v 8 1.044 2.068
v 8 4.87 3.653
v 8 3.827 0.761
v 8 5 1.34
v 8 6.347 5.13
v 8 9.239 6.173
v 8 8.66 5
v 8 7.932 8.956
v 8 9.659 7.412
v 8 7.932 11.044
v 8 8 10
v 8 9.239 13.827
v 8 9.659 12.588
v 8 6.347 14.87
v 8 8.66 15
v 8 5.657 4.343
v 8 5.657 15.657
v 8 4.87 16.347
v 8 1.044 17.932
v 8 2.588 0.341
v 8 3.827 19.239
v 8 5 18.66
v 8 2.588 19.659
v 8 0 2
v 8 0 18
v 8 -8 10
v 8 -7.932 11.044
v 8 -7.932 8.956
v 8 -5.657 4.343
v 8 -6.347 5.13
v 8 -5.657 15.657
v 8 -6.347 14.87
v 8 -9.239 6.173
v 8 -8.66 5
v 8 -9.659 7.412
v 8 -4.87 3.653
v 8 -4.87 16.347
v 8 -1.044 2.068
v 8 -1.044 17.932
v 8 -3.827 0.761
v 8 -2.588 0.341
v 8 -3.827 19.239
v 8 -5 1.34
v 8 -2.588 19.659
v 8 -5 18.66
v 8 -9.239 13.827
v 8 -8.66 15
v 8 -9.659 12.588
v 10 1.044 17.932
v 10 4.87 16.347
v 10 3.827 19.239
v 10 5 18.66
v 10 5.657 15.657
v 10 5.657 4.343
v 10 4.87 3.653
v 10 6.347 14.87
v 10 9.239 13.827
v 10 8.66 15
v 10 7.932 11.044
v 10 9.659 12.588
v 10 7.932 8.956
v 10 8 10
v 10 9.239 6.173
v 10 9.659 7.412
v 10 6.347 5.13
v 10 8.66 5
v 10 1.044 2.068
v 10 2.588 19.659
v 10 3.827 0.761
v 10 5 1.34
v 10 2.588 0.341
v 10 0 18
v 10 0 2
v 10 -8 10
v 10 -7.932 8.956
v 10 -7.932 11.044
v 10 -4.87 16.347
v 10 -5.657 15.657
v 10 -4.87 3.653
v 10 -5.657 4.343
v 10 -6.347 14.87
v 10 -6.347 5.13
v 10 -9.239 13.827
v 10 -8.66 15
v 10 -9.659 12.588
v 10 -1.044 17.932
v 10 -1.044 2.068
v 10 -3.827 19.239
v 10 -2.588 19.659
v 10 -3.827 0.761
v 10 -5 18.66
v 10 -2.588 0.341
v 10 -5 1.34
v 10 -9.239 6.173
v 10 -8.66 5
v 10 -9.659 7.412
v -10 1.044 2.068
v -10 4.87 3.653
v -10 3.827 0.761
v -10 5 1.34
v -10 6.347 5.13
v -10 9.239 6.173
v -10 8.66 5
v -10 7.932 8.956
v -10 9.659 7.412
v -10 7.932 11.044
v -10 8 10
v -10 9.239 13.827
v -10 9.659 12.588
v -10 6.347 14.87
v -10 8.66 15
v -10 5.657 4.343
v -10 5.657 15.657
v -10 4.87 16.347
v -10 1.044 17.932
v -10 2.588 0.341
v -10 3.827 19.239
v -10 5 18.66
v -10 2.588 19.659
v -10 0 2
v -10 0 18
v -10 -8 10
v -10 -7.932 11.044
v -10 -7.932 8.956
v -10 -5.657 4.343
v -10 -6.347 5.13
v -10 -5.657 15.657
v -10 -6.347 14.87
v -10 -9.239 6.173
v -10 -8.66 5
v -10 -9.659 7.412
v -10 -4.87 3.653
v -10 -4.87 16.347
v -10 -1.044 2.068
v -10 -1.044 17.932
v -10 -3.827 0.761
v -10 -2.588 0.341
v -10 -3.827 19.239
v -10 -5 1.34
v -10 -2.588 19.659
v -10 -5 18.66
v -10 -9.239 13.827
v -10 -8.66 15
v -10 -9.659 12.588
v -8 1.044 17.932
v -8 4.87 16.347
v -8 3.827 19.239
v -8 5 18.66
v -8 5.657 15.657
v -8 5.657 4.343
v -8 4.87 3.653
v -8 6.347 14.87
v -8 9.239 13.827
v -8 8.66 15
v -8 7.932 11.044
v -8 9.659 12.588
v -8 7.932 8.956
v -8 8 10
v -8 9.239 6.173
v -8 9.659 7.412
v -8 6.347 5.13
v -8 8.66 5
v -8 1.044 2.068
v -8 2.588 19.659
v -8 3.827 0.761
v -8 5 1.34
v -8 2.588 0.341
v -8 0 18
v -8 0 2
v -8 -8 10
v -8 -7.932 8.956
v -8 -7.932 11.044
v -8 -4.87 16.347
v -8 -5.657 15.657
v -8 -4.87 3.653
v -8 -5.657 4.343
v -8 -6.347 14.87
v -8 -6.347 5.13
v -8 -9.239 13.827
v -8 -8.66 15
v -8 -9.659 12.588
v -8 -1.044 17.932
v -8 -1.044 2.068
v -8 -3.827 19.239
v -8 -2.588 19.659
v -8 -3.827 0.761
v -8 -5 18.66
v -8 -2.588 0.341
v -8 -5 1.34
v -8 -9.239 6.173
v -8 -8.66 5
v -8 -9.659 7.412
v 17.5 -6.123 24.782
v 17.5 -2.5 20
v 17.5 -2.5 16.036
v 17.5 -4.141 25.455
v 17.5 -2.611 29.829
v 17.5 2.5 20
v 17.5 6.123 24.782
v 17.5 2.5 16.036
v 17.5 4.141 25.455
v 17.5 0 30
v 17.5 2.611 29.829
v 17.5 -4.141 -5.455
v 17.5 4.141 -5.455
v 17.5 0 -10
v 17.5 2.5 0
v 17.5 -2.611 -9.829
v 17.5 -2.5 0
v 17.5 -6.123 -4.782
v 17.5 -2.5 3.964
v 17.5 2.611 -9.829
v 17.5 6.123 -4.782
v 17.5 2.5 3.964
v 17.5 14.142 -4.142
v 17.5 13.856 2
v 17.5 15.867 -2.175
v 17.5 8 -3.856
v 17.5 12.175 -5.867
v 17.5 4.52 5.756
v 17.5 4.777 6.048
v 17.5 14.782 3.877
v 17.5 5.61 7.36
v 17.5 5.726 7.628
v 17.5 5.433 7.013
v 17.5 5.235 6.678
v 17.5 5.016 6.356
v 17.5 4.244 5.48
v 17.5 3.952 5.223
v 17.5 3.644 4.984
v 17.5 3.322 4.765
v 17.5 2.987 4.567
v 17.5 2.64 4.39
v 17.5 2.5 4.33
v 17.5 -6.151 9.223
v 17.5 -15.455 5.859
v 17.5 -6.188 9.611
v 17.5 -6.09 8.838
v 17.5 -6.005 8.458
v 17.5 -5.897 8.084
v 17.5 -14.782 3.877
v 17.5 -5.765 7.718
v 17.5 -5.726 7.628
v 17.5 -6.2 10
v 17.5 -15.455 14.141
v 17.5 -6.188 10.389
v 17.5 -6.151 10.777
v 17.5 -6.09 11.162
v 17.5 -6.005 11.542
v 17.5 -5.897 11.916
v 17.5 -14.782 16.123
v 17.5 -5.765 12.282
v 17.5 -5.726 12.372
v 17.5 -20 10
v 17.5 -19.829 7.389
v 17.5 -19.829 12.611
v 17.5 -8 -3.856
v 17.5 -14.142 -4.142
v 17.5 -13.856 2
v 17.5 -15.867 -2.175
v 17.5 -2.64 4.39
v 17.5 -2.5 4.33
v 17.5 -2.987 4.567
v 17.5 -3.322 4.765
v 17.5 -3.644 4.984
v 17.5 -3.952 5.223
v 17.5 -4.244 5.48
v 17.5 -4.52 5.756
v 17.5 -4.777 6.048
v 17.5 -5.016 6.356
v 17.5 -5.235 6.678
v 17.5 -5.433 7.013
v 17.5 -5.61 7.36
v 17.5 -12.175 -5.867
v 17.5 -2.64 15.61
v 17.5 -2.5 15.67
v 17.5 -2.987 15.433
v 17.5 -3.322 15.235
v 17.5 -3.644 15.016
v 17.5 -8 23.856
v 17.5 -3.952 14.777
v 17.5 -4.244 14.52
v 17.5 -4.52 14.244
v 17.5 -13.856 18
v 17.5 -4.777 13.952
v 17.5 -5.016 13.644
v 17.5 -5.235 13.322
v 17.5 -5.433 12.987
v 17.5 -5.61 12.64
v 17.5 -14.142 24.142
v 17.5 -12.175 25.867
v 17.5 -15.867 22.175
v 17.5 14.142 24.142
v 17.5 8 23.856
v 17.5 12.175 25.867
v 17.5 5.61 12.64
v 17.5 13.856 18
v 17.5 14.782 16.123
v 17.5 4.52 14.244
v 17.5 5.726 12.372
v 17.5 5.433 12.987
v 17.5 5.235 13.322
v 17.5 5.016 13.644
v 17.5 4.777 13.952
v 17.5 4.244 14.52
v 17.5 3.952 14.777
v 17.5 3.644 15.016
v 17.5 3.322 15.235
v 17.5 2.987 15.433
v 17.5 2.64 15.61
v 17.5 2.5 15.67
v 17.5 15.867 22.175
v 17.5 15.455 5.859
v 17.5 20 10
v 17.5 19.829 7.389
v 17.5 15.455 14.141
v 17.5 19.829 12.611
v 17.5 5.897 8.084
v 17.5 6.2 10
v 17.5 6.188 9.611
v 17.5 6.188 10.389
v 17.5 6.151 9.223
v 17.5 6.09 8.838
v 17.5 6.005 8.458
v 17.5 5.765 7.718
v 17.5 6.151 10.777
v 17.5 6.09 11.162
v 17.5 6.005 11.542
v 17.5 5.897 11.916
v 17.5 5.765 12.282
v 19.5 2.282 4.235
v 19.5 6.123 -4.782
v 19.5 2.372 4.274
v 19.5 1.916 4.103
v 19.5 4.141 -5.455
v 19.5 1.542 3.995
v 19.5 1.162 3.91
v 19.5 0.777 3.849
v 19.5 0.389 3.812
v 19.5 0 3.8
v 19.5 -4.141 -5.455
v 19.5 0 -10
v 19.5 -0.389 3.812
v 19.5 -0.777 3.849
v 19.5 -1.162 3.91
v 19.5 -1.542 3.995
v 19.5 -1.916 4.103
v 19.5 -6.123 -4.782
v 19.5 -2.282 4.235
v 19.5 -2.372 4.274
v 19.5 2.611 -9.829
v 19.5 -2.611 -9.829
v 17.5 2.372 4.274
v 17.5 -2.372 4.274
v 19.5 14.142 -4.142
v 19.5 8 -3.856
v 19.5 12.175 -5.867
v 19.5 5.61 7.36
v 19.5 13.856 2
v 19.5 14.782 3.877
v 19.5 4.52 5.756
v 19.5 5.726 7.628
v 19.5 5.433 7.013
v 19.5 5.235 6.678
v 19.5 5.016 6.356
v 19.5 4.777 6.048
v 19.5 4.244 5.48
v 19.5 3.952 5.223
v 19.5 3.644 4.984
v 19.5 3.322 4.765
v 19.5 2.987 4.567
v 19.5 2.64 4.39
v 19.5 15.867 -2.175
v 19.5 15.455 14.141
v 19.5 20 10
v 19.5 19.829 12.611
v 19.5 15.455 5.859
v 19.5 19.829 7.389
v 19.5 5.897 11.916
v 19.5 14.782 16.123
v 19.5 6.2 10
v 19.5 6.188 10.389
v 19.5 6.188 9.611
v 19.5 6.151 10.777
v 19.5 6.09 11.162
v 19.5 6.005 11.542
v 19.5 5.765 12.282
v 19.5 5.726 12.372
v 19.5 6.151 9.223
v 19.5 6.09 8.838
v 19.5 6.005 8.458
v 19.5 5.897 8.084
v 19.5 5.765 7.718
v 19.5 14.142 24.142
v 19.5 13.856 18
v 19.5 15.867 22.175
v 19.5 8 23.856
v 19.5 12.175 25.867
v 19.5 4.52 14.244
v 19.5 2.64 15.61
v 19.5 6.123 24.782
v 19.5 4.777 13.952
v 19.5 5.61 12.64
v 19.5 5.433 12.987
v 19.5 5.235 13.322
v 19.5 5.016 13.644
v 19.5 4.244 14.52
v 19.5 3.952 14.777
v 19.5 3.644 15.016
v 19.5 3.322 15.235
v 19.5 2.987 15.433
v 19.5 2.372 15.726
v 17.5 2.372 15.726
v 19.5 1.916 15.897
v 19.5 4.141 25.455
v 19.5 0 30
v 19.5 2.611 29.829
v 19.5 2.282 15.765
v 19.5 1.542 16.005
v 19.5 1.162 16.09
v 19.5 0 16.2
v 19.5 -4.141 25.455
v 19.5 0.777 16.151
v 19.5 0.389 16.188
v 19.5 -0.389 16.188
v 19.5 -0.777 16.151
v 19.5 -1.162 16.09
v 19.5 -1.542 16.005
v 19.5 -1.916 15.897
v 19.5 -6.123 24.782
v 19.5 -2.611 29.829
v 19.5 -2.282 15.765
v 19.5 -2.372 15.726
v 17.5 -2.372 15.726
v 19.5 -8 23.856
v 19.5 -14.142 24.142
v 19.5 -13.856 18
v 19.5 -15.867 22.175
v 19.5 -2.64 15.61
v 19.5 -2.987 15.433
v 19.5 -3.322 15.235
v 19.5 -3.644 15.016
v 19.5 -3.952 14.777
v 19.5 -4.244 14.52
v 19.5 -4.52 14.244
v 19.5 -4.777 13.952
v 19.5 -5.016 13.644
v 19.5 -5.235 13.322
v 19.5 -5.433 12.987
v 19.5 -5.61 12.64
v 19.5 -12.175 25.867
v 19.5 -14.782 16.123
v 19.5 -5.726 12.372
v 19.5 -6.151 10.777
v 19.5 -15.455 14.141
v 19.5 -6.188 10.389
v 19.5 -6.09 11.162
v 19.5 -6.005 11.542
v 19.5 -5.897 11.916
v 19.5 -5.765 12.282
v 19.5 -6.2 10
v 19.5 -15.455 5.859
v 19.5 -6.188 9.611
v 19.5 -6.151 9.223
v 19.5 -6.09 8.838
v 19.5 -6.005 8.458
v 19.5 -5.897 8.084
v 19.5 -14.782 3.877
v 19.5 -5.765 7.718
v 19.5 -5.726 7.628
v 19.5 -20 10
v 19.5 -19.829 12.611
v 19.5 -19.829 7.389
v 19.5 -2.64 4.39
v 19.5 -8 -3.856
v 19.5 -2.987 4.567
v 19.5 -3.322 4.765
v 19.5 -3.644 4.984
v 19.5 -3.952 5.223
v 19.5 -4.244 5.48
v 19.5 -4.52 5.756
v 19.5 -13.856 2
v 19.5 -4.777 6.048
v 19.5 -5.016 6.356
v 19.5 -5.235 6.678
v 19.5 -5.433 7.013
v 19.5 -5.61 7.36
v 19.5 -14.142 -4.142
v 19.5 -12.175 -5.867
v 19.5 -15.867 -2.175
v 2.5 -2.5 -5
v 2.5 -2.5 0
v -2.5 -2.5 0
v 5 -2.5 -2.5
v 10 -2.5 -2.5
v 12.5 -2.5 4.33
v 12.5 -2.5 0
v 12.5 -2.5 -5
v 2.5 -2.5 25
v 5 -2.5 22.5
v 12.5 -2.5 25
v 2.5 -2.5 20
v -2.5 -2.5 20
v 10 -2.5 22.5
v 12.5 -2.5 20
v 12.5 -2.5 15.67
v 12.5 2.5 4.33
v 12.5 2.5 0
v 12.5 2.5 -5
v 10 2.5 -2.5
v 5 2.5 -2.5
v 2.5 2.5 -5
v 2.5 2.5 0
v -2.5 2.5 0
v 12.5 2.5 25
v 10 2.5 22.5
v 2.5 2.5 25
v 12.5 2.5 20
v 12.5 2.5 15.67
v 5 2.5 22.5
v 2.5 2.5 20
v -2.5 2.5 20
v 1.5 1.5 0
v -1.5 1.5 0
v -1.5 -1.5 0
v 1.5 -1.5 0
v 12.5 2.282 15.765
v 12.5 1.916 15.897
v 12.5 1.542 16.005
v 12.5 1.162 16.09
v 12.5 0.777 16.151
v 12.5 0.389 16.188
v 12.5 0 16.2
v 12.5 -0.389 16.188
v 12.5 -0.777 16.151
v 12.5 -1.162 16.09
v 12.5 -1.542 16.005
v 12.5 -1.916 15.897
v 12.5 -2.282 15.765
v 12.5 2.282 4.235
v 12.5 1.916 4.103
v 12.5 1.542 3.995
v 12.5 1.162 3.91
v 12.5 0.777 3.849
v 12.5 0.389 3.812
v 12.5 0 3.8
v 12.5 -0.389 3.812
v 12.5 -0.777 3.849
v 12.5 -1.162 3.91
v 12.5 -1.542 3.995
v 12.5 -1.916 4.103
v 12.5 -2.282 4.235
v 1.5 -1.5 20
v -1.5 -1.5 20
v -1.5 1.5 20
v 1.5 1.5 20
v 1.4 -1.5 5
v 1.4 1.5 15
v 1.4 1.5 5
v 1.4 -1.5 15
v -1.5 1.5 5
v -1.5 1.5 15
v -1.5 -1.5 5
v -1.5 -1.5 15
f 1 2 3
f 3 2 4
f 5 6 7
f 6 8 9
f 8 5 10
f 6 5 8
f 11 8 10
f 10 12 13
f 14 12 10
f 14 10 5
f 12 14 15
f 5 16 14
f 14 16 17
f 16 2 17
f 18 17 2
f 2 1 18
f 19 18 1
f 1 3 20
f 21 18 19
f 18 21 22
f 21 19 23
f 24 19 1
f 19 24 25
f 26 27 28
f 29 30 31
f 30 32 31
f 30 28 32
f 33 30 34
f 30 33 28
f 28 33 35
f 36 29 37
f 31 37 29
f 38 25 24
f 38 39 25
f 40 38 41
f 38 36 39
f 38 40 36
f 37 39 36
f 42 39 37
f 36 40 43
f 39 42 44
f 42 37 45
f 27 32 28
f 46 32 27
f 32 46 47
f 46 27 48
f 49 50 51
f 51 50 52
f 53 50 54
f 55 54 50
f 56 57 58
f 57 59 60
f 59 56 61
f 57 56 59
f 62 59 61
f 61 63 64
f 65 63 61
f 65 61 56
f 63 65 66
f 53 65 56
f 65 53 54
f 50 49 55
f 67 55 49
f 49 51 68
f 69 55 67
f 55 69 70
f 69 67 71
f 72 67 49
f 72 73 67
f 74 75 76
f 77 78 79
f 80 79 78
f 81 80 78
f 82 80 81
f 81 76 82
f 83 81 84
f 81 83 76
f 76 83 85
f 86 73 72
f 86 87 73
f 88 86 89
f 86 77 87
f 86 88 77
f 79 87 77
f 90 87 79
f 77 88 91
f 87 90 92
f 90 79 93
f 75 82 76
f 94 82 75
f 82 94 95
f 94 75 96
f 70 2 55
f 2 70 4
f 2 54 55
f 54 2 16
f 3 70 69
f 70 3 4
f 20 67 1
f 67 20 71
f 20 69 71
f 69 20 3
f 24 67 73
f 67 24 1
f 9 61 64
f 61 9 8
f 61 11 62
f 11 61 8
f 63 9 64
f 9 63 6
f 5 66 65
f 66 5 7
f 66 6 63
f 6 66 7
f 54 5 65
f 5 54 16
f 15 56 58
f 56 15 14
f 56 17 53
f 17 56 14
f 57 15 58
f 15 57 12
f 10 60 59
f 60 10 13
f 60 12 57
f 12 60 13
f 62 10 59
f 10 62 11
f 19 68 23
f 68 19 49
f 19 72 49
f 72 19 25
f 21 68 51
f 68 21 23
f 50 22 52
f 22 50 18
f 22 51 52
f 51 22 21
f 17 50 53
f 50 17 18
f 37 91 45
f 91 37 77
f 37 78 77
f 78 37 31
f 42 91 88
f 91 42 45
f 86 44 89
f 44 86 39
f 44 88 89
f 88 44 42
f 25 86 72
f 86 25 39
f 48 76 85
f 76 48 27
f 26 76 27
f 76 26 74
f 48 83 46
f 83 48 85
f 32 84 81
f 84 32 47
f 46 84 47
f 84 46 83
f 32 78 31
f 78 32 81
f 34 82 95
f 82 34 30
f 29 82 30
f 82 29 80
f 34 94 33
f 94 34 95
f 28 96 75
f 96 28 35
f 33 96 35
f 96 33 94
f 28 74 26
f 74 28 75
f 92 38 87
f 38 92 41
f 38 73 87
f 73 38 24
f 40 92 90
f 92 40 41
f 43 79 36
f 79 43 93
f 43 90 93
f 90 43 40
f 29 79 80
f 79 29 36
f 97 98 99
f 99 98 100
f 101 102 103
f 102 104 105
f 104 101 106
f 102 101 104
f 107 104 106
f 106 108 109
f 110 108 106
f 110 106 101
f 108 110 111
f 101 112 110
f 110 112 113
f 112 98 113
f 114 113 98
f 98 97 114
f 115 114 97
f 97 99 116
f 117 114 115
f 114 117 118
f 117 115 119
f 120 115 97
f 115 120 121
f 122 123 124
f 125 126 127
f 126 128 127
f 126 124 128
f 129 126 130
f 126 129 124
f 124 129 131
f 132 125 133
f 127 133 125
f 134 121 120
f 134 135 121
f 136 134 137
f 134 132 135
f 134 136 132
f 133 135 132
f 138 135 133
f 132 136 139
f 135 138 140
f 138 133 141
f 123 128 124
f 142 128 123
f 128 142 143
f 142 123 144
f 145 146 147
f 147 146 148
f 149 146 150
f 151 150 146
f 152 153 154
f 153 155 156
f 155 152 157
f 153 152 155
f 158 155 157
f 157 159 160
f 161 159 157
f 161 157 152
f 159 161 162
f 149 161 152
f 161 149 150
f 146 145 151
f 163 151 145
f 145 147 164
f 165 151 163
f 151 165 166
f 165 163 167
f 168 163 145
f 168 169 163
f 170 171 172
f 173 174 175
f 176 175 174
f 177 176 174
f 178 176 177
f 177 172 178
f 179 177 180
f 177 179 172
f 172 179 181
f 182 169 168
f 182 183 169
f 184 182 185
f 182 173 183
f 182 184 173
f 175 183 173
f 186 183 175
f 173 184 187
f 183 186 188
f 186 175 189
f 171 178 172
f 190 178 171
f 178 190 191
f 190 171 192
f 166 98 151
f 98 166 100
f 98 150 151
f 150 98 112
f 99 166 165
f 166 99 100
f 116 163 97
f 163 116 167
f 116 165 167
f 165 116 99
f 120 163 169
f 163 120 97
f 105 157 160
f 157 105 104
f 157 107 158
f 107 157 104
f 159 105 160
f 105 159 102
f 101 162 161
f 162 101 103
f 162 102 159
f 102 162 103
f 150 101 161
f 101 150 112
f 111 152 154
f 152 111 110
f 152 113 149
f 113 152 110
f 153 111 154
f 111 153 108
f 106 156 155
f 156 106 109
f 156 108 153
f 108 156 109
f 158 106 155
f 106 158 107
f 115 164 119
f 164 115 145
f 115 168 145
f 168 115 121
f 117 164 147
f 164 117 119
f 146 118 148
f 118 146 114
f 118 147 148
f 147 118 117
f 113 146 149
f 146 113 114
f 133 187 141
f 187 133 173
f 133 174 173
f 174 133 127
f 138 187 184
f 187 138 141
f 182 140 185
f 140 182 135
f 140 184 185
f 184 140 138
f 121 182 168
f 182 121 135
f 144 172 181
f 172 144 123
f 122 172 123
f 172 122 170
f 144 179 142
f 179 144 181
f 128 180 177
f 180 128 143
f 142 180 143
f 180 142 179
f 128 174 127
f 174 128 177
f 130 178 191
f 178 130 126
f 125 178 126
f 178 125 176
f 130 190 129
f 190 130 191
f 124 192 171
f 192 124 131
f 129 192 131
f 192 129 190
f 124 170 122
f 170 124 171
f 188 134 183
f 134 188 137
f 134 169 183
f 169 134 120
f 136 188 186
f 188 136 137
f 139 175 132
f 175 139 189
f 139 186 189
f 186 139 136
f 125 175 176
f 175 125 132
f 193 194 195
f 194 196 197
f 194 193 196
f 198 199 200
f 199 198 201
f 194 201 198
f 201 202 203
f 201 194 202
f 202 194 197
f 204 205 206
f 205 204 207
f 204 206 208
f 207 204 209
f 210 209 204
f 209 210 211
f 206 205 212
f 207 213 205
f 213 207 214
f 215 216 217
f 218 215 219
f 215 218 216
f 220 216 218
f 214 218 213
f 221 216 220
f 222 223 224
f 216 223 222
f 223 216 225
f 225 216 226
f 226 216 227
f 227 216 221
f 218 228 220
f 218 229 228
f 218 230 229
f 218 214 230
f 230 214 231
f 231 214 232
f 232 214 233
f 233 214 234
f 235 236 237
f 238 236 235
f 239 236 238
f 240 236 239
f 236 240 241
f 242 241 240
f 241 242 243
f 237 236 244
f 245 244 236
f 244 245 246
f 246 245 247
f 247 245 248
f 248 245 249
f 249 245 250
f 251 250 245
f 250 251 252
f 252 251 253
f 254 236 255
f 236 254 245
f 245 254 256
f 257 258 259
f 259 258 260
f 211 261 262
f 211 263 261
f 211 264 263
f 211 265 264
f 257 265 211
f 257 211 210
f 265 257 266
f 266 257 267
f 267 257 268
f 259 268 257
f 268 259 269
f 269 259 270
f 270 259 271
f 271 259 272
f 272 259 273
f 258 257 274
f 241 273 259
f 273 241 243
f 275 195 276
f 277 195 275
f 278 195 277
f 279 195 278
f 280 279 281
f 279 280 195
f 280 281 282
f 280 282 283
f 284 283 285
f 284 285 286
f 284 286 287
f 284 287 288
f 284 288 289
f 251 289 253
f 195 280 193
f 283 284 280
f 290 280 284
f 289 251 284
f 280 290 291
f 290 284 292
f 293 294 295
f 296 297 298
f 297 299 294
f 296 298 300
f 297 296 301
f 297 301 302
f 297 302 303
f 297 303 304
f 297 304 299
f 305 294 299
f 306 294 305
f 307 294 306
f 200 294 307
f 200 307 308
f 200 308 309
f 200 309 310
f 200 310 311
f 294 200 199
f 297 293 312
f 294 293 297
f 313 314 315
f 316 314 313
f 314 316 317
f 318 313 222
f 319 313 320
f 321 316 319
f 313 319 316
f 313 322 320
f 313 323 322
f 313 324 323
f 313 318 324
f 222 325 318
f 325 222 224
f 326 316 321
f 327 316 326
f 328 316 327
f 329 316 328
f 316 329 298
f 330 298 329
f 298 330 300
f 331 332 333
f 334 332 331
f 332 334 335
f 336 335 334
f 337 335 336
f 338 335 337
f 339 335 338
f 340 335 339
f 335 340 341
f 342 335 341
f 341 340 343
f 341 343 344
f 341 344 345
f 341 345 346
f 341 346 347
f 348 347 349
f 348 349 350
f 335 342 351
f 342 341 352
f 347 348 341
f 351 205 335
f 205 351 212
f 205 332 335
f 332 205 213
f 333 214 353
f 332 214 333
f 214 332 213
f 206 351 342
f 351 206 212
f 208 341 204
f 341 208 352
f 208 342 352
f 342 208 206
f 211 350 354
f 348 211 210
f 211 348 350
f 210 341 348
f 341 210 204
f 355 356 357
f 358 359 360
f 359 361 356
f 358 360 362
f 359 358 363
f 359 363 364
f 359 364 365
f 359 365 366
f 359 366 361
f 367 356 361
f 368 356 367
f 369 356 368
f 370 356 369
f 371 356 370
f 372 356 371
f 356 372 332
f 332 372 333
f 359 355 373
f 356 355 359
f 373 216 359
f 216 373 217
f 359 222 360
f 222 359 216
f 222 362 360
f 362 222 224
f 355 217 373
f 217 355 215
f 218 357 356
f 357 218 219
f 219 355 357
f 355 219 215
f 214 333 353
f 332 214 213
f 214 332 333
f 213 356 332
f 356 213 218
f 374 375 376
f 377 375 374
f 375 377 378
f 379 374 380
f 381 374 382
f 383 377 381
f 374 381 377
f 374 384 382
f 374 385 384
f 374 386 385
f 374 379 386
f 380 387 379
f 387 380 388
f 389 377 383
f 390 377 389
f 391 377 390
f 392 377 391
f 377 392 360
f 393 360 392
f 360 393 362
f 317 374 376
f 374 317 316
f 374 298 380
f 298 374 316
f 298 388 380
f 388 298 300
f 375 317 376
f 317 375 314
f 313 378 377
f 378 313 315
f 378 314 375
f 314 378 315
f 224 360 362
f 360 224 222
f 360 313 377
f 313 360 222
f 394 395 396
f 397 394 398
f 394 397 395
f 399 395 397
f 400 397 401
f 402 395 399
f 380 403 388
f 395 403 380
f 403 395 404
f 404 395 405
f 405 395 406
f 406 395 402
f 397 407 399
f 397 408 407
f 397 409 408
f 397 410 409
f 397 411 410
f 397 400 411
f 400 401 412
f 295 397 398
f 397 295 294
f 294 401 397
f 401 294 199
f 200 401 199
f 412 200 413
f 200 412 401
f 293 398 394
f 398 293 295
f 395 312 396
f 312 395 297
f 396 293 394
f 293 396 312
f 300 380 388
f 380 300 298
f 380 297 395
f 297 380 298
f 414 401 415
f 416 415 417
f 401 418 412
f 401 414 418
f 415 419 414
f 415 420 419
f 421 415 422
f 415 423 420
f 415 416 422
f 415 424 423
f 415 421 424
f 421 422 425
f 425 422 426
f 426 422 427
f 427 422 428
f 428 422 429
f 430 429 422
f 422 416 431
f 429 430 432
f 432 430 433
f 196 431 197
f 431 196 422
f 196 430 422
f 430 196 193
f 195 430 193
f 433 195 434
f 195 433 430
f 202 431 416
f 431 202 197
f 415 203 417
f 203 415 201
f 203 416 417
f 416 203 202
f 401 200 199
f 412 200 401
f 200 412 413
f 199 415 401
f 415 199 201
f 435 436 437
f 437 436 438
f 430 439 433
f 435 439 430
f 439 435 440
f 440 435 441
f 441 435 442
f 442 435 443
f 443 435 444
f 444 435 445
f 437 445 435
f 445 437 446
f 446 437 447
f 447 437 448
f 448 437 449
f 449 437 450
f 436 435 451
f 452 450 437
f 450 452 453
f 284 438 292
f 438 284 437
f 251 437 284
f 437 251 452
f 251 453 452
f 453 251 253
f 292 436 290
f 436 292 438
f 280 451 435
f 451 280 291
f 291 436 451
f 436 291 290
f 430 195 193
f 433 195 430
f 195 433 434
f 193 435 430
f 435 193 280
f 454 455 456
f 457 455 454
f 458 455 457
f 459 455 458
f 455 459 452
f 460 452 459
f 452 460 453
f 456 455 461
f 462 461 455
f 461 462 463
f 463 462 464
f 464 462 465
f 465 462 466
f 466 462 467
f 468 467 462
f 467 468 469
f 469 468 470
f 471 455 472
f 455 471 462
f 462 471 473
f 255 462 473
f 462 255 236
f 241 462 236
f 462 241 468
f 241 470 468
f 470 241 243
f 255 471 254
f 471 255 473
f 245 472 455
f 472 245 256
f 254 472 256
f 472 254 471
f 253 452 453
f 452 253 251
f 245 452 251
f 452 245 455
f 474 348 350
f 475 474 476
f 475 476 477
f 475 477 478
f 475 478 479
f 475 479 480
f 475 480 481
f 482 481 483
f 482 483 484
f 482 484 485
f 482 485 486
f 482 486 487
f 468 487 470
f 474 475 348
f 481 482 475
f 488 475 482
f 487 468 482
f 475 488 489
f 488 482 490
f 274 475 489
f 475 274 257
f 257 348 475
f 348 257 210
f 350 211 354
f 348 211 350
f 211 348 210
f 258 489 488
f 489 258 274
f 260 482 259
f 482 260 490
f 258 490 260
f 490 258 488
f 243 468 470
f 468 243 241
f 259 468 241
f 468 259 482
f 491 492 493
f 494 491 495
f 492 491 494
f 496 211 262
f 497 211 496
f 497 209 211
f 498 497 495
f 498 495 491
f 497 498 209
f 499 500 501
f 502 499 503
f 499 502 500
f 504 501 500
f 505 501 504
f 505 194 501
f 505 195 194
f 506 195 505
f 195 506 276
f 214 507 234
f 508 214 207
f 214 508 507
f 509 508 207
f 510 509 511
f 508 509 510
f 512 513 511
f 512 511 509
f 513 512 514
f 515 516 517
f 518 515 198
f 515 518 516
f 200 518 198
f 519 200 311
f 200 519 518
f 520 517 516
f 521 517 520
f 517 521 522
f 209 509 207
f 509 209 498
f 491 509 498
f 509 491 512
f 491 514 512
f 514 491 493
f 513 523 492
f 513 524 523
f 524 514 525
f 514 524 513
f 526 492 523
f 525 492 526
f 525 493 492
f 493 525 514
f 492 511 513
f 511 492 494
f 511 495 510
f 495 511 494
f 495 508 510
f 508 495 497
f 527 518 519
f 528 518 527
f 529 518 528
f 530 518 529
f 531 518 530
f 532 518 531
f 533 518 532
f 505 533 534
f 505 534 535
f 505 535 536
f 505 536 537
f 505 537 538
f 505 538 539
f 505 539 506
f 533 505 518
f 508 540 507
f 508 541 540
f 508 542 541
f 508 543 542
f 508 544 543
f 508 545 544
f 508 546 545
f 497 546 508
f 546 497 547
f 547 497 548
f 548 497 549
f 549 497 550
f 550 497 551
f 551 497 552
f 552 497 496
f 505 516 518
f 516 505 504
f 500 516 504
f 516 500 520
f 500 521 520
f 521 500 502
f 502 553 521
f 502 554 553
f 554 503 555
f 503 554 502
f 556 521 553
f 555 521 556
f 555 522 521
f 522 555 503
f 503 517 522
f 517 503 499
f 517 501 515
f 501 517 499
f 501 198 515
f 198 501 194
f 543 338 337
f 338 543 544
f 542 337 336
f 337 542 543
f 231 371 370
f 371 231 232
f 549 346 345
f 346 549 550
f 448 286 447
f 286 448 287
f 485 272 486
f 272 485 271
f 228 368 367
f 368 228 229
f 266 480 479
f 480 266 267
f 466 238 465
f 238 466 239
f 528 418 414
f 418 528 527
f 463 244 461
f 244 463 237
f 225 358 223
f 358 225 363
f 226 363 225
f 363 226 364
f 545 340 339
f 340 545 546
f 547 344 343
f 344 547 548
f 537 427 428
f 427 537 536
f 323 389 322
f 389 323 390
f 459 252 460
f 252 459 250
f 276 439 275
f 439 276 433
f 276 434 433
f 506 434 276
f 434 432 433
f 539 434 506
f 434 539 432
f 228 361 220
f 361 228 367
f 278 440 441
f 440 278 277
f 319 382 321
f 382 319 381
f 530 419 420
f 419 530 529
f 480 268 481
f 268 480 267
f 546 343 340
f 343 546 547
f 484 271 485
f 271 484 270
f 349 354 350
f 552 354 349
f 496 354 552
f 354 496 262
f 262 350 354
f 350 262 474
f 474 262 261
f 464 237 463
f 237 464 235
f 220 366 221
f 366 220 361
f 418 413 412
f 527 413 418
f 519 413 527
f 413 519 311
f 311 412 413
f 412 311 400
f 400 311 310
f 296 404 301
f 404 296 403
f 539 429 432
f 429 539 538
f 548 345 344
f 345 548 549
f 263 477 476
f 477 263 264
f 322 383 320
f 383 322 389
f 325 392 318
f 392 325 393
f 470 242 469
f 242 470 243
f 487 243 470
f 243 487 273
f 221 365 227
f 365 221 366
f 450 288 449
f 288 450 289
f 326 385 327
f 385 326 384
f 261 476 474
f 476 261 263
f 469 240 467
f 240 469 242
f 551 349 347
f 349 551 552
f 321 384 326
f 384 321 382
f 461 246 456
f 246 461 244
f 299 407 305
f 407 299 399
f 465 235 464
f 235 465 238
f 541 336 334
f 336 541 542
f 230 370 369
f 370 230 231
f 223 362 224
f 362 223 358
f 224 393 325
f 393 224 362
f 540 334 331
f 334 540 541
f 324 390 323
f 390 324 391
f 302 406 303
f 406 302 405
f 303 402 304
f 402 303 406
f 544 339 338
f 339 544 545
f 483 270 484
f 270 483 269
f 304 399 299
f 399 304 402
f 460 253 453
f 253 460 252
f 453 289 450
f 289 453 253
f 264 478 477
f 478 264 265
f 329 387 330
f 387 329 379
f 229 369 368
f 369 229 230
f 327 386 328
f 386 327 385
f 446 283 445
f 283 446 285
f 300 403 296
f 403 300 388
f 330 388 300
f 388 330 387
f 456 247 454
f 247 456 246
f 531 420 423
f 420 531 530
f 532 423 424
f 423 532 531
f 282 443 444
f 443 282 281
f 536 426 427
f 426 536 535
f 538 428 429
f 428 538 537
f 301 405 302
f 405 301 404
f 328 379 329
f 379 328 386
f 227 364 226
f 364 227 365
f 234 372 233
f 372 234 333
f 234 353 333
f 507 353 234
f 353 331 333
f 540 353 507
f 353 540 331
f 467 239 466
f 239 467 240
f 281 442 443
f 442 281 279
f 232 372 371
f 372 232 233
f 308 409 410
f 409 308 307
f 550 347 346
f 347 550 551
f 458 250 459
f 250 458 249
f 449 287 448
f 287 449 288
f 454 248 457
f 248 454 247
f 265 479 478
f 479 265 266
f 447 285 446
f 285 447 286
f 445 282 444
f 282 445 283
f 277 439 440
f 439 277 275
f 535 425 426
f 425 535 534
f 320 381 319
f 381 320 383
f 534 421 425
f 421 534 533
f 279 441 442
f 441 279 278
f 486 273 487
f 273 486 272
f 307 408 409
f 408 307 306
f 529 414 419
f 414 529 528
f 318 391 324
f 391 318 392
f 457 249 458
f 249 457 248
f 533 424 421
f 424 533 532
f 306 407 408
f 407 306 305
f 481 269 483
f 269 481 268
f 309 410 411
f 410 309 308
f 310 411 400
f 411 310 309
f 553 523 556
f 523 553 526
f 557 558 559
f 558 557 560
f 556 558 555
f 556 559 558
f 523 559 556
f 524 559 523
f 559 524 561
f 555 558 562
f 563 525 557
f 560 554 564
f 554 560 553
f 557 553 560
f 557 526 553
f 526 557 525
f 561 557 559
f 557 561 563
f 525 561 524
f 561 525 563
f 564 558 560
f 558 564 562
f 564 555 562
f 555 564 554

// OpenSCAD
module gear(n, r, h, l) {
    tooth_angle = 360 / n / 2;
    
    
    for (i = [0: n]) {
        rotate([0, 0, tooth_angle * i * 2])
        union() {
            linear_extrude(l)
            polygon([
                [0, 0],
                [r, 0],
                [r * cos(tooth_angle / 3), r * sin(tooth_angle / 3)],
                [(r-h) * cos(2 * tooth_angle / 3), (r-h) * sin(2 * tooth_angle / 3)],
                [(r-h) * cos(tooth_angle), (r-h) * sin(tooth_angle)]
            ]);
            
            linear_extrude(l)
            rotate([180, 0, 0])
            polygon([
                [0, 0],
                [r, 0],
                [r * cos(tooth_angle / 3), r * sin(tooth_angle / 3)],
                [(r-h) * cos(2 * tooth_angle / 3), (r-h) * sin(2 * tooth_angle / 3)],
                [(r-h) * cos(tooth_angle), (r-h) * sin(tooth_angle)]
            ]);
        }
    }
}

module axis_gears() {
    translate([8, 0, 10])
    rotate([22.5, 0, 0])
    rotate([0, 90, 0])
    gear(8, 10, 2, 2);
    
    translate([-10, 0, 10])
    rotate([22.5, 0, 0])
    rotate([0, 90, 0])
    gear(8, 10, 2, 2);
}

module gears() {
    gear(8, 10, 2, 2);

    translate([0, 0, 18])
    gear(8, 10, 2, 2);
}

module spinning_gears() {
    difference() {
        union() {
            translate([-2.5, -2.5, 0])
            rotate([-90, 0, 0])
            linear_extrude(5)
            polygon([
                [0, 0], [5, 5], [15, 5], [20, 0], [20, -20], [15, -25],
                [5, -25], [0, -20], [5, -20], [7.5, -22.5], [12.5, -22.5], 
                [15, -20], [15, 0], [12.5, 2.5], [7.5, 2.5], [5, 0]
            ]);
            
            translate([17.5, 0, 10])
            rotate([0, 90, 0])
            gear(8, 20, 4, 2);
        }
        
        translate([0, 0, 10])
        rotate([0, 90, 0])
        cylinder(40, 6.2, 6.2);
    }
    
    translate([1.4, -1.5, 0])
    cube([0.1, 3, 20]);
    
    translate([-1.5, -1.5, 0])
    cube([3, 3, 5]);
    
    translate([-1.5, -1.5, 15])
    cube([3, 3, 5]);

}

$fn = 100;

//gears();
axis_gears();
spinning_gears();

//difference() {
//    gear(8, 10, 3, 2);
//    cylinder(2, 3, 3);
//}
//
//translate([20, 0, 0])
//difference() {
//    gear(8, 8, 2, 2);
//    cylinder(2, 3, 3);
//}
//
//translate([35, 0, 0])
//difference() {
//    gear(8, 5, 1.5, 2);
//    cylinder(2, 1.5, 1.5);
//}
//
//
//translate([45, 0, 0])
//difference() {
//    gear(8, 3, 1, 2);
//    cylinder(2, 1, 1);
//}
